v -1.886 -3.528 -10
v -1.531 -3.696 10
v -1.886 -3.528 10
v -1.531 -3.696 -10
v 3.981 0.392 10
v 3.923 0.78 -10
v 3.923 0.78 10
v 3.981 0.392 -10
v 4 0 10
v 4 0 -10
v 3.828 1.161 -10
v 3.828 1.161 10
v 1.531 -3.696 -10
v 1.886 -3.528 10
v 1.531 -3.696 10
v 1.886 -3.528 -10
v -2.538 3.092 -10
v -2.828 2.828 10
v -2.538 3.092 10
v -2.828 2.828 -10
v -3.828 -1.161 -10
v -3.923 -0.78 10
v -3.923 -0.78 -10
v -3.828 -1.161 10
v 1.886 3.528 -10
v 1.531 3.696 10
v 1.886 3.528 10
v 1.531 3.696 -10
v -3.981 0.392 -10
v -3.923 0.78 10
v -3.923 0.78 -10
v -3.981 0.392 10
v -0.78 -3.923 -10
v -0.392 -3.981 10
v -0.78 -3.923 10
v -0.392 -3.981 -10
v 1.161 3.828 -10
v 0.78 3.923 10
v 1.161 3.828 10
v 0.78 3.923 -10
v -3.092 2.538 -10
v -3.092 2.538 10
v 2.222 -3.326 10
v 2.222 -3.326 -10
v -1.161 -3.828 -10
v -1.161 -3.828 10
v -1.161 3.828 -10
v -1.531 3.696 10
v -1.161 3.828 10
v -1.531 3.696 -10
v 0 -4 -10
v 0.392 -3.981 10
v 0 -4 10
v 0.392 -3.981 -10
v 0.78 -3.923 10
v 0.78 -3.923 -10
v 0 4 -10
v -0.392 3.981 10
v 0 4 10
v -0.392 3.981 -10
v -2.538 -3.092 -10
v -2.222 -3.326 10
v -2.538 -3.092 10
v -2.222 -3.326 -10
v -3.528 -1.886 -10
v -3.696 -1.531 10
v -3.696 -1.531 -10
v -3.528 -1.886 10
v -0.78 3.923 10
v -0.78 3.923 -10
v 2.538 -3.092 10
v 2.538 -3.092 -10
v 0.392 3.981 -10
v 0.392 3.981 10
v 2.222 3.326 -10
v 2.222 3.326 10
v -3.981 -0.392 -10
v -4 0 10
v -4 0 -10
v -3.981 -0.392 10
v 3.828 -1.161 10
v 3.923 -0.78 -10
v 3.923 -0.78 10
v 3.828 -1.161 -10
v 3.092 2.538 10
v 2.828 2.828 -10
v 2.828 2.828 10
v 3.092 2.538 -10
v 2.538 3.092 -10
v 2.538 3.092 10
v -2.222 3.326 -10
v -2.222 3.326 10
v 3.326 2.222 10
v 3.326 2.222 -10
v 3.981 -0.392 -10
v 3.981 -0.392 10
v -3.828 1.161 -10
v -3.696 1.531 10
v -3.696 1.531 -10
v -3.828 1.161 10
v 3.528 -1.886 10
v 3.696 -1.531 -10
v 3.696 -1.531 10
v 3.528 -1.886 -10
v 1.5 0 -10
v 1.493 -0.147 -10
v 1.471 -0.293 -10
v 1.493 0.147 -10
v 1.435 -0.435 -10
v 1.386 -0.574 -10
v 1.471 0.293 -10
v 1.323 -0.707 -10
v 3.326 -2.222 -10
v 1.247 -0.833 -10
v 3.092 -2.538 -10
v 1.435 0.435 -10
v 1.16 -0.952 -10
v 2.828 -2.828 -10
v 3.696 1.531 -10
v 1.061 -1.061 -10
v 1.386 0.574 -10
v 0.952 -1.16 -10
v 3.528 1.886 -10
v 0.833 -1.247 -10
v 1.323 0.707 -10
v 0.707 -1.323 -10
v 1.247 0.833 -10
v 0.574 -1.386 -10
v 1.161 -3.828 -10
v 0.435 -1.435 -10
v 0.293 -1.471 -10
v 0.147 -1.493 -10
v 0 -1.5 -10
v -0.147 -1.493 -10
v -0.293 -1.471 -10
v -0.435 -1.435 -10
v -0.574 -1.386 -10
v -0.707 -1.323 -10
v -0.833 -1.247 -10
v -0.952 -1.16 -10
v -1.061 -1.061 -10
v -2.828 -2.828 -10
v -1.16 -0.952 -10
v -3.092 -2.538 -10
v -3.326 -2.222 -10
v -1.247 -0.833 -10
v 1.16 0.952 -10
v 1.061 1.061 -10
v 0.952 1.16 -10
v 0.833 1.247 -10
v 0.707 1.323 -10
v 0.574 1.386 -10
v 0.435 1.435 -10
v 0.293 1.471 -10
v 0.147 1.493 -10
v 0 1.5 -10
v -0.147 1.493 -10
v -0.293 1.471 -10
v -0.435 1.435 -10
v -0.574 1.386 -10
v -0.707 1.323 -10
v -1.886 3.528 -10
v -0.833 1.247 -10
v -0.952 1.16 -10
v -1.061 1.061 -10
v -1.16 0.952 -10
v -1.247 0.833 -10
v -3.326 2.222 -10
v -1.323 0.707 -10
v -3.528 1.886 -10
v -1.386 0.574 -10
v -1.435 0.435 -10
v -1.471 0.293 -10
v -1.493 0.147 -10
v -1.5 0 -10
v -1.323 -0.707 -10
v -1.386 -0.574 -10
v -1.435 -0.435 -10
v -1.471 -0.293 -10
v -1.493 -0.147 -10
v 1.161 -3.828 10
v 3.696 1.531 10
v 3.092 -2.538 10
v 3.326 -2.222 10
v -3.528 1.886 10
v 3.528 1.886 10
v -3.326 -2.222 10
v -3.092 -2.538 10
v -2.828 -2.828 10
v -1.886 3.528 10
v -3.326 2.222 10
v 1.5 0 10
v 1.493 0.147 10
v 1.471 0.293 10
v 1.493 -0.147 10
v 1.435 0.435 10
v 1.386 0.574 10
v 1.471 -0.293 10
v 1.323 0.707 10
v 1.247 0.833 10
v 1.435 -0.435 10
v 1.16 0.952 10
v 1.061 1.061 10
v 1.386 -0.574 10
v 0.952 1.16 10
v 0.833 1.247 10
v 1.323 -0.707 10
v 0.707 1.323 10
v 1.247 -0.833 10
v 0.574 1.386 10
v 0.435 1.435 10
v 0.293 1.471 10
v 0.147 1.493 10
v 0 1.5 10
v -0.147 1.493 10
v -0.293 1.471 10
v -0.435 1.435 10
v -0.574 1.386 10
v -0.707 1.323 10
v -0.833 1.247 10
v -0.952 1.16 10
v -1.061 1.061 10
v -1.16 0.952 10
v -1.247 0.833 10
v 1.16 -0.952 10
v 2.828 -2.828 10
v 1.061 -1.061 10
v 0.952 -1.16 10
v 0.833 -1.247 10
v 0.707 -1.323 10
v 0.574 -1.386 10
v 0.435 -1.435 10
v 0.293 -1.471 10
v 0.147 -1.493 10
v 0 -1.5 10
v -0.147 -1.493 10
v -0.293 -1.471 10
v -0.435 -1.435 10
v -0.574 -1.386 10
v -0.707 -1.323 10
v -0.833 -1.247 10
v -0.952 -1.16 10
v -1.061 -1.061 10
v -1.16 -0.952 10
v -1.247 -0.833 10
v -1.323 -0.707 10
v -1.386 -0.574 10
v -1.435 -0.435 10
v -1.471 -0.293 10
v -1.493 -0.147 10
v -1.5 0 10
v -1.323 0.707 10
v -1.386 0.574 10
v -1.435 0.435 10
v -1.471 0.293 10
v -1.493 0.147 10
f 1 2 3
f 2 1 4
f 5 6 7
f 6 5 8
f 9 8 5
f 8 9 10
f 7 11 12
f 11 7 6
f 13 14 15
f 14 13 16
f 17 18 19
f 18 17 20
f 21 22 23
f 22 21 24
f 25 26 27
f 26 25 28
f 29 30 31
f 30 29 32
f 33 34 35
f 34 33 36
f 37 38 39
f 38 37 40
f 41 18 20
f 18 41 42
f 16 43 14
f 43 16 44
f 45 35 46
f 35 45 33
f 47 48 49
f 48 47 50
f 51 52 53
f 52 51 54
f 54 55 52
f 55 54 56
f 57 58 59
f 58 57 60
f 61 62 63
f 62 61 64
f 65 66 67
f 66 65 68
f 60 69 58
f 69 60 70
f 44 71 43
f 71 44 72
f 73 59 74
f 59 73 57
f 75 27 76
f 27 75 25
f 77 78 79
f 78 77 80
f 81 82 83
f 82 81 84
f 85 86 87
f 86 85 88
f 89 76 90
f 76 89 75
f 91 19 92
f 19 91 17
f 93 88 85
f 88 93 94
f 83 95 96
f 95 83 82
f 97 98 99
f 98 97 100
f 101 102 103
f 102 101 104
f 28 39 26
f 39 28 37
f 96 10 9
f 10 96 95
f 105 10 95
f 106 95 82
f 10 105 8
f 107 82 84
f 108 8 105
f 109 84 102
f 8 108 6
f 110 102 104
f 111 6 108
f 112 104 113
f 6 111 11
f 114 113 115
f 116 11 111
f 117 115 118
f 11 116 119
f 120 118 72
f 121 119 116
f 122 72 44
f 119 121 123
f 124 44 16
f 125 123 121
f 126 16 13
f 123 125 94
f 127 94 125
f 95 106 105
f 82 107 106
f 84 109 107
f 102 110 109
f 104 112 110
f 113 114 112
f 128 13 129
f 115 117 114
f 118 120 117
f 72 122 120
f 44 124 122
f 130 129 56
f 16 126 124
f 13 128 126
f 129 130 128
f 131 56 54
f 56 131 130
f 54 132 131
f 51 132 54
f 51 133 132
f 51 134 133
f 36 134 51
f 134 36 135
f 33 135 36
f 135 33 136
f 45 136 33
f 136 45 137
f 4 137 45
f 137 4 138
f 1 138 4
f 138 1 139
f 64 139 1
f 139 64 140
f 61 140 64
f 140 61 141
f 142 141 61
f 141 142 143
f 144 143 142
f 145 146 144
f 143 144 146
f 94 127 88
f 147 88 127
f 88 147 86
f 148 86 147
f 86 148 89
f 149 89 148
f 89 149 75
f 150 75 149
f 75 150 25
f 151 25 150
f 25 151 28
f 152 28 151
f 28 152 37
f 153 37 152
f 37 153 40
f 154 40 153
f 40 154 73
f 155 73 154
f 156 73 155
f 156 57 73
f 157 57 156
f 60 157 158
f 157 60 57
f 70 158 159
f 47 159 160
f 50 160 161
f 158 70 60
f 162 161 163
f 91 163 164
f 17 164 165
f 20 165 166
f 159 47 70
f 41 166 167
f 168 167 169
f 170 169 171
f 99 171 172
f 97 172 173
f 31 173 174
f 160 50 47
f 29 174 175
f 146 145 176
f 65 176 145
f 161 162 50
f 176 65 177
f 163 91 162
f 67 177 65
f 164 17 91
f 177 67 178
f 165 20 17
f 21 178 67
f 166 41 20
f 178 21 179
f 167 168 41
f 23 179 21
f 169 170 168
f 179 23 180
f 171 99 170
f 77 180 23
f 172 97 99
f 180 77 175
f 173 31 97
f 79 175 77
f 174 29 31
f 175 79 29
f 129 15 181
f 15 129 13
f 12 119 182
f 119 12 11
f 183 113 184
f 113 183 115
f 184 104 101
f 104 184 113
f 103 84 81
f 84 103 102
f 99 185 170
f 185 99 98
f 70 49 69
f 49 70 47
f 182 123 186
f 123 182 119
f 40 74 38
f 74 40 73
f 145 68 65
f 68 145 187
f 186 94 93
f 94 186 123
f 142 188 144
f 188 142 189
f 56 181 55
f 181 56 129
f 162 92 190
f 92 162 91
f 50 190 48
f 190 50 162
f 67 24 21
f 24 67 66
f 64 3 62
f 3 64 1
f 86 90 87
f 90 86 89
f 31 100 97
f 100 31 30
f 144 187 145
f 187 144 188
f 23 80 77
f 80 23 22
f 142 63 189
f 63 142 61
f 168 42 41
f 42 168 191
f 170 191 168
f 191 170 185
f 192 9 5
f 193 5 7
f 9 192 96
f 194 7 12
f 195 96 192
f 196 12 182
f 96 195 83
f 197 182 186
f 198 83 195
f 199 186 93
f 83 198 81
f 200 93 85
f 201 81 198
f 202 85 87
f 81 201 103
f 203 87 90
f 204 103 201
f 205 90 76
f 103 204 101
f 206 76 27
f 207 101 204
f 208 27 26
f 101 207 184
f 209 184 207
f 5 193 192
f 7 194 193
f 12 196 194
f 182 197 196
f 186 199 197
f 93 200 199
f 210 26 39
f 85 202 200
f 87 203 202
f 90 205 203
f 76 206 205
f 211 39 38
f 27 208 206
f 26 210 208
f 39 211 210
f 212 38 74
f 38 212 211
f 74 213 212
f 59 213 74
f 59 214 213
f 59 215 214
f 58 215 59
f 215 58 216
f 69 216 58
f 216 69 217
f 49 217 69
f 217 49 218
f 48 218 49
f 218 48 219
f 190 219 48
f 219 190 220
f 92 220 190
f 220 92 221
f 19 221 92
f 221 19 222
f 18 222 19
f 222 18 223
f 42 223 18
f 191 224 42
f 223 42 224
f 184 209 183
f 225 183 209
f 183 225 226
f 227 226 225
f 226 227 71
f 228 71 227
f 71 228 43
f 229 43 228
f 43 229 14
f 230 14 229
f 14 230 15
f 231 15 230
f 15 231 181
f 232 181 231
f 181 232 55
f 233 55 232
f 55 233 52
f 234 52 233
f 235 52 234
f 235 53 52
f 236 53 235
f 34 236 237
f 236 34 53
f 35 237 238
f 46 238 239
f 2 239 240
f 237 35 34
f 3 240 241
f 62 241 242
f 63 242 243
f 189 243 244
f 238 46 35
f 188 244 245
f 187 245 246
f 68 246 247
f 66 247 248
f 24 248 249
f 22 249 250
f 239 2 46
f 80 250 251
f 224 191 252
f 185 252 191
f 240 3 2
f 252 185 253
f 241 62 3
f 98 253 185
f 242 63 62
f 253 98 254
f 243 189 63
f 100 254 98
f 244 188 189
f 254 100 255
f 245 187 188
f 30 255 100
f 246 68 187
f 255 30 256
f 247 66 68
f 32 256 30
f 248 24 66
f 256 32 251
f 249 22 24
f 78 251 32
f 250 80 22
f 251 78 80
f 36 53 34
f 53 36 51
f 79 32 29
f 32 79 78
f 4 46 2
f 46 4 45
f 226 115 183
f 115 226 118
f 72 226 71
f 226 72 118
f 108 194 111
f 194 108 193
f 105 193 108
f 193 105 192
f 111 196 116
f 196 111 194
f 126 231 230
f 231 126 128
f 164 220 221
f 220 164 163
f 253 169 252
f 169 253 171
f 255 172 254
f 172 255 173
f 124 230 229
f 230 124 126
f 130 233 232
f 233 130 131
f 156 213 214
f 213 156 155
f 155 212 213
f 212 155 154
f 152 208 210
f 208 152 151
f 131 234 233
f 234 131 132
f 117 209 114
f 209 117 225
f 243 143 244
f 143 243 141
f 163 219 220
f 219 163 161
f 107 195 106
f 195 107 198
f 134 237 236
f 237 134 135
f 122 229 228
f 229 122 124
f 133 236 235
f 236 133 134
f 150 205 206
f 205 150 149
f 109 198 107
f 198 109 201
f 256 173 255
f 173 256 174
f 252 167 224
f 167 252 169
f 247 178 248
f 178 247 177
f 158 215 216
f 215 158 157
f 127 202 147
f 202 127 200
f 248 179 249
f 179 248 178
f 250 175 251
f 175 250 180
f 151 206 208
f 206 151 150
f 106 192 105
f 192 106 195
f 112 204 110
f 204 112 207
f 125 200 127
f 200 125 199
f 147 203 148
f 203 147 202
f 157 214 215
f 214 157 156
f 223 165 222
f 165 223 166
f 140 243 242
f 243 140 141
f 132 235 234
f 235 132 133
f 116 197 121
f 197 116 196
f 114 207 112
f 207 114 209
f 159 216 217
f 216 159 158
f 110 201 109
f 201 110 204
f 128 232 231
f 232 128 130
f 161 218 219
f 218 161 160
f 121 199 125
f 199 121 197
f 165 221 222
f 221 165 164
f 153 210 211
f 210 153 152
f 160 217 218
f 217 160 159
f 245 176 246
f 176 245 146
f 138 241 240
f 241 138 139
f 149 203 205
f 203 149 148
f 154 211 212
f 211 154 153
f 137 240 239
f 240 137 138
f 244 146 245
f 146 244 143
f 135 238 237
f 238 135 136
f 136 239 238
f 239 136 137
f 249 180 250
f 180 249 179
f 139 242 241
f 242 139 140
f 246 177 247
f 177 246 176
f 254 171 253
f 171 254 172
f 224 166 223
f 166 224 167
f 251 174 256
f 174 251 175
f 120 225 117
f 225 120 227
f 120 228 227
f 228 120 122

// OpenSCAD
$fn=64;

thread_d = 3.0;
pillar_d = 8.0;
len = 20.0;

module standoff_pillar(thread_d, pillar_d, len){
    difference(){
        cylinder(d=pillar_d, h=len, center=true);
        cylinder(d=thread_d, h=len+0.4, center=true);
    }
}

standoff_pillar(thread_d, pillar_d, len);
